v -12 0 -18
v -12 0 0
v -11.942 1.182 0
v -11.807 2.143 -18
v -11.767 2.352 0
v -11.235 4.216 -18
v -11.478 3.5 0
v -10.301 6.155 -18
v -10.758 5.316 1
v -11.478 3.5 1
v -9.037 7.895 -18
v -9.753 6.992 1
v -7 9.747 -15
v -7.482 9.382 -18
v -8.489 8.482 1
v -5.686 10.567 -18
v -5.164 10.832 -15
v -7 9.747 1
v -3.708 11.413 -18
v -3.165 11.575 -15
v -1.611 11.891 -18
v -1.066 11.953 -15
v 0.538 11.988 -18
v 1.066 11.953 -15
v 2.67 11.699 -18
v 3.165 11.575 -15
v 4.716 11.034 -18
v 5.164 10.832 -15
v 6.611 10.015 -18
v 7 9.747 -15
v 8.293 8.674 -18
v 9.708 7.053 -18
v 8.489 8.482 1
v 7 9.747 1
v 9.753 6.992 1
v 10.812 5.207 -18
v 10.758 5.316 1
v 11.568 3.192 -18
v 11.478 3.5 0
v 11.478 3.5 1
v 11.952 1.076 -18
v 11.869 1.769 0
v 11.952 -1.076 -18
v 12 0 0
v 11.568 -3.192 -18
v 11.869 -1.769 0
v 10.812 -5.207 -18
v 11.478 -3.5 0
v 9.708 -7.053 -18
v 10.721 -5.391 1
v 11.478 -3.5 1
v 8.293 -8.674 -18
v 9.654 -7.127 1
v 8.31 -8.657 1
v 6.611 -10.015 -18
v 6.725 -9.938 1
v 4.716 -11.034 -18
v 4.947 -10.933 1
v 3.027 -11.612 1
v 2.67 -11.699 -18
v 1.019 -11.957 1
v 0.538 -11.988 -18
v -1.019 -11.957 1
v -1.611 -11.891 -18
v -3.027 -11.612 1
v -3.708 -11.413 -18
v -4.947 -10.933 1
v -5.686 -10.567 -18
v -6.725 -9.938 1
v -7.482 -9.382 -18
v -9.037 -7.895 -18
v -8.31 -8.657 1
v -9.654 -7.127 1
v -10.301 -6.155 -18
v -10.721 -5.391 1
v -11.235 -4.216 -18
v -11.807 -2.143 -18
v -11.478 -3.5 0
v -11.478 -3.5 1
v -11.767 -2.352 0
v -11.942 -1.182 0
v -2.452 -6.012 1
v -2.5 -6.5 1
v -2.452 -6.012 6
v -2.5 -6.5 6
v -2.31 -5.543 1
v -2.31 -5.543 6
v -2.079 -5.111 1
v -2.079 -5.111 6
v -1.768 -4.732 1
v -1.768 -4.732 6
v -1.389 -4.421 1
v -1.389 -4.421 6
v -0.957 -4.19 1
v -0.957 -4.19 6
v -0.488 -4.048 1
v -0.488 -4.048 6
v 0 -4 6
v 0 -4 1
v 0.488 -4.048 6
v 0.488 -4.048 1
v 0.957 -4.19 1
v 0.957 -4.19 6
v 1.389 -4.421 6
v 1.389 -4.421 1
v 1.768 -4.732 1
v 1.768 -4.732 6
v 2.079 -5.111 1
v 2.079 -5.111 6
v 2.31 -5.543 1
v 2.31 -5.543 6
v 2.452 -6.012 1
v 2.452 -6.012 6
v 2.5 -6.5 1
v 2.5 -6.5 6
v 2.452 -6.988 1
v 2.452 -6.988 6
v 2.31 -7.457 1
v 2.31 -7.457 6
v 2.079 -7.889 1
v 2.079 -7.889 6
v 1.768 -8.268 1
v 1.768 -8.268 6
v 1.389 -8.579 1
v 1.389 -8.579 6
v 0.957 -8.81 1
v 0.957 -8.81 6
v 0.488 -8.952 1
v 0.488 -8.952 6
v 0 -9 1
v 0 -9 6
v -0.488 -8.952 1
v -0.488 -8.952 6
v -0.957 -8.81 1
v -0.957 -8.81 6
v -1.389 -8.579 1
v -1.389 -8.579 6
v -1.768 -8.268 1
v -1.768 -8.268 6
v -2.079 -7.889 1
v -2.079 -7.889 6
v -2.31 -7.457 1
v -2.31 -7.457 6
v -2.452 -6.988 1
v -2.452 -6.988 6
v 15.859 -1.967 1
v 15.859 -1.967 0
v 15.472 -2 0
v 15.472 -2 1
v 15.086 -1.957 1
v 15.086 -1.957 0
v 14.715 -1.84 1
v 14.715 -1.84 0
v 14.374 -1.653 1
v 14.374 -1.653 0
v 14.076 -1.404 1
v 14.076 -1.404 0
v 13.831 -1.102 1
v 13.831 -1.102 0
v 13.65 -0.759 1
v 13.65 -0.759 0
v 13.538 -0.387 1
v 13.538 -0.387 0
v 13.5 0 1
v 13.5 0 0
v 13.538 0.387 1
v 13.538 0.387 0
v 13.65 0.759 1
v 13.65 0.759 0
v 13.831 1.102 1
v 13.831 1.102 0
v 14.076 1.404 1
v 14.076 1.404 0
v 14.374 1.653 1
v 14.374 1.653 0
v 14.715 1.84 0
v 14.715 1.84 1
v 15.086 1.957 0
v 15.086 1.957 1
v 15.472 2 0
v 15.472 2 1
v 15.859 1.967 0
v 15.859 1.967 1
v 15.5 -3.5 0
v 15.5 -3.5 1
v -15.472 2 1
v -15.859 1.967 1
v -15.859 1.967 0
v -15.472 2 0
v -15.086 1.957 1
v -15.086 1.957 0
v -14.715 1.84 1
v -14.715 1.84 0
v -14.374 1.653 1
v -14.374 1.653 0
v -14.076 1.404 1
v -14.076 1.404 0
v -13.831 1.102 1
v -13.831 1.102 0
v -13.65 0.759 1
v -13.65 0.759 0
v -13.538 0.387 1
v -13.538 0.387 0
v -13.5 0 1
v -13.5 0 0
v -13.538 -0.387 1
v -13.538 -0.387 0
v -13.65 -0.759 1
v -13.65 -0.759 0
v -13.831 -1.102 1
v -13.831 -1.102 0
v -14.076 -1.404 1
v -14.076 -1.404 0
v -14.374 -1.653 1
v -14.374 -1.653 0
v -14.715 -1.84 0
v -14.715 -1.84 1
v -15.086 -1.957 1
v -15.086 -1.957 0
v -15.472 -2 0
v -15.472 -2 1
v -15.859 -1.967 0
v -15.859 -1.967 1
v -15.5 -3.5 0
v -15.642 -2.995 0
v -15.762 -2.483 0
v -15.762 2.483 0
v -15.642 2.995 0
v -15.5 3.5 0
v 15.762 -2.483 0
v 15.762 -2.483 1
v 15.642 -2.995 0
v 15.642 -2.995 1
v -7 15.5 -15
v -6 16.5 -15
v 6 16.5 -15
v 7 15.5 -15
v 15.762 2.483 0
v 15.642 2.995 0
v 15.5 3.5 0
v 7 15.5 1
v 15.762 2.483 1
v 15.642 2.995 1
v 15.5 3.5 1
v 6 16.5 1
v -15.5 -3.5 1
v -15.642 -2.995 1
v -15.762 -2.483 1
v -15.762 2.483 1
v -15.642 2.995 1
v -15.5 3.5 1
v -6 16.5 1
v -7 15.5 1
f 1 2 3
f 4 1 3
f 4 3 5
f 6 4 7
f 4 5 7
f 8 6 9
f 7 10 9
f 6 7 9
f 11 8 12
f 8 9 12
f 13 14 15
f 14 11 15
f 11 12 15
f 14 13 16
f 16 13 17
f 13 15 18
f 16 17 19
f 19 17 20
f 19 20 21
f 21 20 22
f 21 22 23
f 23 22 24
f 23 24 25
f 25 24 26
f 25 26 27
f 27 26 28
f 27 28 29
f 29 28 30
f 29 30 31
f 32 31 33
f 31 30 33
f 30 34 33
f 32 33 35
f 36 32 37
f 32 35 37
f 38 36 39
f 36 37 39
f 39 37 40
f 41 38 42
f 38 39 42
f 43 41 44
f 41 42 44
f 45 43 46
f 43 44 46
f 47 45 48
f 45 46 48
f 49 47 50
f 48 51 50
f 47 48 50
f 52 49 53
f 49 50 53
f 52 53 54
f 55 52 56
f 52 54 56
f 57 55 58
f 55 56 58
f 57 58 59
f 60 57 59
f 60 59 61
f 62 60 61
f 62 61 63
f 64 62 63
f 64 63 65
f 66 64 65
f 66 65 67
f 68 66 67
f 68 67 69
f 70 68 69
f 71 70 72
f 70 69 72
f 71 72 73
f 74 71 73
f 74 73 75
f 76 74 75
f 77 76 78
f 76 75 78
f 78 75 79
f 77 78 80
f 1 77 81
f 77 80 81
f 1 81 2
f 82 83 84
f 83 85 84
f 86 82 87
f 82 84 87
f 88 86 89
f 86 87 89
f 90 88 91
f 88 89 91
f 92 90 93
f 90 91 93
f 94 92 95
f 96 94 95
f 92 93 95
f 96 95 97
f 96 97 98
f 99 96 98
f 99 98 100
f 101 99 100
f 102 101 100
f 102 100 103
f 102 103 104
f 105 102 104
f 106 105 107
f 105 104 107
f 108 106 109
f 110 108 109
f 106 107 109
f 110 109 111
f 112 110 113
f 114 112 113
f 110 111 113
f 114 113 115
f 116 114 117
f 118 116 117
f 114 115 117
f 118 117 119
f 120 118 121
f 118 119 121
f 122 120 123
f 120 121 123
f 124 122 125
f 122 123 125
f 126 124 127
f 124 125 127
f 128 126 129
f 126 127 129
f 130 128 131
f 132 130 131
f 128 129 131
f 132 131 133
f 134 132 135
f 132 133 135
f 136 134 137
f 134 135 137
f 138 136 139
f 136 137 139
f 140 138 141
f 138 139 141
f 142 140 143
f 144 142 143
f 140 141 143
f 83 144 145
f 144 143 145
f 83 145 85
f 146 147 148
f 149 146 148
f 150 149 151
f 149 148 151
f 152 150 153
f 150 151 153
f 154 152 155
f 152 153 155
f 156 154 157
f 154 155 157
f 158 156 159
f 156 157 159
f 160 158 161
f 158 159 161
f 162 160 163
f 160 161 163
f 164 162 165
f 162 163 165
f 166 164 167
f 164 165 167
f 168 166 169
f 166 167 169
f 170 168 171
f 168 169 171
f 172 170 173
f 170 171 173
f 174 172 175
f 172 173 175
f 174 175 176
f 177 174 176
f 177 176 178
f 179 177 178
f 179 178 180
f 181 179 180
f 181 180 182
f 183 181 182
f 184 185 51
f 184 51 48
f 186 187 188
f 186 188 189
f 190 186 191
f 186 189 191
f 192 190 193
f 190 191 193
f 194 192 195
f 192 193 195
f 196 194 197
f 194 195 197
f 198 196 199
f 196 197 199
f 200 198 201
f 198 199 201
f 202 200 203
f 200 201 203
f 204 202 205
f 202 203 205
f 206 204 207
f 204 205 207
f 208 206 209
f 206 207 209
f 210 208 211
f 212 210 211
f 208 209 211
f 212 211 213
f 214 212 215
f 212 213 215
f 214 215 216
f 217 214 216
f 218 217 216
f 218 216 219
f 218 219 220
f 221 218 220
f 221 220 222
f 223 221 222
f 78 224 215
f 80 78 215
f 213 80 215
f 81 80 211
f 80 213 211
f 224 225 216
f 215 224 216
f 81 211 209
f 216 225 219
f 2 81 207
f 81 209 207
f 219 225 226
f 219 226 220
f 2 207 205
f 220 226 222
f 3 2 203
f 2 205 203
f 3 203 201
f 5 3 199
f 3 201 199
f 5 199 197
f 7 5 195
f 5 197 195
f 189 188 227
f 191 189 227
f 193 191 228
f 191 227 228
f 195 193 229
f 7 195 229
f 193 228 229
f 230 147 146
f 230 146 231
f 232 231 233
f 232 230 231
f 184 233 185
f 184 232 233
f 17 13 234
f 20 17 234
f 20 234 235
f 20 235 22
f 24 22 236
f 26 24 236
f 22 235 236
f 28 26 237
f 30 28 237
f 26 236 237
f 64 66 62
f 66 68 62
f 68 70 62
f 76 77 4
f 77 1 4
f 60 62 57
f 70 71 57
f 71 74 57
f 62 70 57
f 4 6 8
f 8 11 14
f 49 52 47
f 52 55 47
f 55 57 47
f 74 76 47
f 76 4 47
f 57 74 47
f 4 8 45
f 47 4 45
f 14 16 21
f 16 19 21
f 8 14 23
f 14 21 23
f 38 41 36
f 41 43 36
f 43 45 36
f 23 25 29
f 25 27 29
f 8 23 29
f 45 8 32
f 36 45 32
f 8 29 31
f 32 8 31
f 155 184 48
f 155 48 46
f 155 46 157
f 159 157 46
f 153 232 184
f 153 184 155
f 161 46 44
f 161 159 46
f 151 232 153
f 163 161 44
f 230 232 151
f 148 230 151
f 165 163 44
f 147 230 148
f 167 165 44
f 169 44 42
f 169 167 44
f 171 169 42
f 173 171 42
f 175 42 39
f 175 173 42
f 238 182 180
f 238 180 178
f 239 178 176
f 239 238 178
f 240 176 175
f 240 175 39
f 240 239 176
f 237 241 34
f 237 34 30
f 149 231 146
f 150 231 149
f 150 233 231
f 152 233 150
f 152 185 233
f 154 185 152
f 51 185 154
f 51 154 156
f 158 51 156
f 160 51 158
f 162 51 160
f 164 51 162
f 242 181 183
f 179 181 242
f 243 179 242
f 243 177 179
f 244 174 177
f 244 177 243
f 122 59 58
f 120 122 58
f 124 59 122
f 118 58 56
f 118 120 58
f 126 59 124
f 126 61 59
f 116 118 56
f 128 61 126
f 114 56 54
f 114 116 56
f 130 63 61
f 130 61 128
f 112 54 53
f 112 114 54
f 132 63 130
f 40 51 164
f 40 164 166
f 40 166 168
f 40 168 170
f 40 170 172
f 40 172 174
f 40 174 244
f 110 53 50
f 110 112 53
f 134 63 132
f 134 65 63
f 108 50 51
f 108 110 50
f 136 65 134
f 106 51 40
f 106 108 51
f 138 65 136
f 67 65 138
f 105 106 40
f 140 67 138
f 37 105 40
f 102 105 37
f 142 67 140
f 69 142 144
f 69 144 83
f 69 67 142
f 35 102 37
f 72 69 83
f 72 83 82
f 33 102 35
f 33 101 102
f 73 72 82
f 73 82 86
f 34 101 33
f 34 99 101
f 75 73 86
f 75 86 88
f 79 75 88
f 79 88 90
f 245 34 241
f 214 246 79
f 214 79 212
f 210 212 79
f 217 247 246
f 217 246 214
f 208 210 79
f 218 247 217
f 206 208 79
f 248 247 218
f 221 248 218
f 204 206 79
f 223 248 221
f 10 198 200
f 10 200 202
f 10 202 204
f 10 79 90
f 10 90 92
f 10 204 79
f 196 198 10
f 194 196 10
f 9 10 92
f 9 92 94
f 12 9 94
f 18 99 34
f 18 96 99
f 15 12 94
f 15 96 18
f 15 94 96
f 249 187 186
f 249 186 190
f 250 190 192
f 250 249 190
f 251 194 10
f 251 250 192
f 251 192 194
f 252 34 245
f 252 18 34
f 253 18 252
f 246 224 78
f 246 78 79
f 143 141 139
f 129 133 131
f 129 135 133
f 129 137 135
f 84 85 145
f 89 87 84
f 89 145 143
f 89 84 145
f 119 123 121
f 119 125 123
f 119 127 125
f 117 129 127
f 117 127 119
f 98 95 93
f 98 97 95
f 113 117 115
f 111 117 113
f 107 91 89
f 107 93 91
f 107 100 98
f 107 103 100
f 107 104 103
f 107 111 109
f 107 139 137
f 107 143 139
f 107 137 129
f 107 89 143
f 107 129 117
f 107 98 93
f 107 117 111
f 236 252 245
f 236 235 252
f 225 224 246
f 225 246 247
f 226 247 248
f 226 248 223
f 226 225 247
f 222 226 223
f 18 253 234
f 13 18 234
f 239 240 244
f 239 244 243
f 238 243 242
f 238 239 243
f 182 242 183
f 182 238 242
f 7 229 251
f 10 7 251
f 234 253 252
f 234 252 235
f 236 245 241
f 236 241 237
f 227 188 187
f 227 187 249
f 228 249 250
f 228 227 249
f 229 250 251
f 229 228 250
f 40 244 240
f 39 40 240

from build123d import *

# Parameters (mm, degrees)
SKETCH_1_W                = 12
SKETCH_1_H                = 19
EXTRUDE_1_REACH           = 37.781
EXTRUDE_1_END_RADIUS      = 12
SKETCH_2_W                = 14
SKETCH_2_H                = 16
EXTRUDE_2_REACH           = 34.679
EXTRUDE_2_START_RADIUS    = 12
EXTRUDE_2_END_RADIUS      = 12
SKETCH_3_W                = 1
SKETCH_3_H                = 7
EXTRUDE_3_REACH           = 34.679
EXTRUDE_3_START_RADIUS    = 12
EXTRUDE_3_END_RADIUS      = 12
SKETCH_4_W                = 1
SKETCH_4_H                = 7
SKETCH_5_W                = 2.5
SKETCH_5_H                = 5
HOLE_WIZARD_4_0_4_1_D     = 4
HOLE_WIZARD_4_0_4_1_DEPTH = 19
CHAMFER_1_SIZE            = 1


with BuildPart() as part:
    # 草图1 → 旋转1 (revolve)
    with BuildSketch(Plane.XZ, mode=Mode.PRIVATE) as revolve_1_sk:
        with Locations((6, -8.5)):
            Rectangle(SKETCH_1_W, SKETCH_1_H)
    revolve(revolve_1_sk.sketch.rotate(Axis((0, 0, 1), (0, 0, -1)), 180), axis=Axis((0, 0, 1), (0, 0, -1)))

    # 凸台-拉伸1: up to this cylinder (the profile starts outside it)
    extrude_1_end = Plane(origin=(0, 0, -7), z_dir=(0, 0, -1)) * Cylinder(EXTRUDE_1_END_RADIUS, 100.562, mode=Mode.PRIVATE)
    # 草图2 → 凸台-拉伸1 (add, up to the surface)
    with BuildSketch(Plane(origin=(0, 16.5, 0), x_dir=(1, 0, 0), z_dir=(0, 1, 0)), mode=Mode.PRIVATE) as extrude_1_sk1:
        with Locations((0, 7)):
            Rectangle(SKETCH_2_W, SKETCH_2_H)
    extrude_1_tool1 = extrude(extrude_1_sk1.sketch, amount=-EXTRUDE_1_REACH, mode=Mode.PRIVATE) - extrude_1_end
    add(extrude_1_tool1.solids().sort_by_distance((0, 16.5, -7))[0])

    # 凸台-拉伸2: from a cylinder face, 34.679 long prism both ways, kept between that surface and its translate by the depth
    extrude_2_start = Plane(origin=(0, 0, 0.5), z_dir=(0, 0, -1)) * Cylinder(EXTRUDE_2_START_RADIUS, 94.358, mode=Mode.PRIVATE)
    extrude_2_end = Plane(origin=(4.021759717, 0, 0.5), z_dir=(0, 0, -1)) * Cylinder(EXTRUDE_2_END_RADIUS, 94.358, mode=Mode.PRIVATE)
    # 草图3 → 凸台-拉伸2 (add, from a surface)
    with BuildSketch(Plane(origin=(-3, 0, 0), x_dir=(0, 0, -1), z_dir=(1, 0, 0)), mode=Mode.PRIVATE) as extrude_2_sk1:
        with Locations((-0.5, 0)):
            Rectangle(SKETCH_3_W, SKETCH_3_H)
    extrude_2_tool1 = extrude(extrude_2_sk1.sketch, amount=EXTRUDE_2_REACH, both=True, mode=Mode.PRIVATE)
    add(((extrude_2_tool1 - extrude_2_start) & extrude_2_end).solids().sort_by_distance((13.48912, 0, 0.5))[0])

    # 凸台-拉伸3: from a cylinder face, 34.679 long prism both ways, kept between that surface and its translate by the depth
    extrude_3_start = Plane(origin=(0, 0, 0.5), z_dir=(0, 0, -1)) * Cylinder(EXTRUDE_3_START_RADIUS, 94.358, mode=Mode.PRIVATE)
    extrude_3_end = Plane(origin=(-4.021759717, 0, 0.5), z_dir=(0, 0, -1)) * Cylinder(EXTRUDE_3_END_RADIUS, 94.358, mode=Mode.PRIVATE)
    # 草图4 → 凸台-拉伸3 (add, from a surface)
    with BuildSketch(Plane.ZY.offset(-3), mode=Mode.PRIVATE) as extrude_3_sk1:
        with Locations((0.5, 0)):
            Rectangle(SKETCH_4_W, SKETCH_4_H)
    extrude_3_tool1 = extrude(extrude_3_sk1.sketch, amount=EXTRUDE_3_REACH, both=True, mode=Mode.PRIVATE)
    add(((extrude_3_tool1 - extrude_3_start) & extrude_3_end).solids().sort_by_distance((-13.48912, 0, 0.5))[0])

    # 草图5 → 旋转2 (revolve)
    with BuildSketch(Plane.XZ.offset(6.5), mode=Mode.PRIVATE) as revolve_2_sk:
        with Locations((1.25, 3.5)):
            Rectangle(SKETCH_5_W, SKETCH_5_H)
    revolve(revolve_2_sk.sketch.rotate(Axis((0, -6.5, 6), (0, 0, -1)), 180), axis=Axis((0, -6.5, 6), (0, 0, -1)))

    # Ø4.0 (4) 直径孔1
    with Locations(Plane.XY.offset(1)):
        with Locations((-15.5, 0), (15.5, 0)):
            Hole(HOLE_WIZARD_4_0_4_1_D / 2, depth=HOLE_WIZARD_4_0_4_1_DEPTH)

    # 倒角1
    chamfer_1_edges = [part.edges().sort_by_distance(p)[0] for p in [
        (-7, 16.5, -7),
        (7, 16.5, -7),
    ]]
    chamfer(chamfer_1_edges, length=CHAMFER_1_SIZE)


solid = part.part
